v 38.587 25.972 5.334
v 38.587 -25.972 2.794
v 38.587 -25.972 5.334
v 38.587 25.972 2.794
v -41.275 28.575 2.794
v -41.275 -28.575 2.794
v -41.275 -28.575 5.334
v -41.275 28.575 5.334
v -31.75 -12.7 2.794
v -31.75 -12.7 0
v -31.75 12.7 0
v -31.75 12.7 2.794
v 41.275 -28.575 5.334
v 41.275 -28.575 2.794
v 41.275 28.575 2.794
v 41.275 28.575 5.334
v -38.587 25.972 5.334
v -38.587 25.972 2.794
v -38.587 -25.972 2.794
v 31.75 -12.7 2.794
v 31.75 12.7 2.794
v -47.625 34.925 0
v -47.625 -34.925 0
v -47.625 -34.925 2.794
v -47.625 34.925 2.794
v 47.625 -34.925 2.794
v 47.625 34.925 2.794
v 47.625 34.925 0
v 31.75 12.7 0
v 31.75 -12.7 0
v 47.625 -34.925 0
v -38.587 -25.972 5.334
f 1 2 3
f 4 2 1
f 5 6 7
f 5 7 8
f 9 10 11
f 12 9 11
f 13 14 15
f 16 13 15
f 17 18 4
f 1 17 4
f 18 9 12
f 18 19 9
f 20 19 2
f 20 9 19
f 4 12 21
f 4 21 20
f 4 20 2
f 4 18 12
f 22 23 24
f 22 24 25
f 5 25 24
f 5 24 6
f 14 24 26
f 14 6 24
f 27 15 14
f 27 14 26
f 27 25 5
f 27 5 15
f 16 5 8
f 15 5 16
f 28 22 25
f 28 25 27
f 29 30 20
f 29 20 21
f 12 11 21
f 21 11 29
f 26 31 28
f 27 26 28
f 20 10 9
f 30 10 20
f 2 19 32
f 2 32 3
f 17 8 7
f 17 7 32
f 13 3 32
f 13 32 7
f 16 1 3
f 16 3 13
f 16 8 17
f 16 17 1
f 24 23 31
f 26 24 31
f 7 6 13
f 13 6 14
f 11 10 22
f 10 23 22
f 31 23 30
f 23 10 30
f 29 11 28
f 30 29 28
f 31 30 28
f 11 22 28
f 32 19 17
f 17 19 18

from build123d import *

# Parameters (mm, degrees)
F0_W     = 95.25
F0_H     = 69.85
F0_W_2   = 82.55
F0_H_2   = 57.15
F1_DEPTH = 2.794
F0_W_3   = 77.174016
F0_H_3   = 51.943318
F2_DEPTH = 5.334
F0_W_4   = 63.5
F0_H_4   = 25.4
F3_DEPTH = 2.794


with BuildPart() as f1:
    # F0 (on Top) → F1 (new body)
    with BuildSketch(Plane.XY):
        Rectangle(F0_W, F0_H)
        Rectangle(F0_W_2, F0_H_2, mode=Mode.SUBTRACT)
    extrude(amount=F1_DEPTH)

    # F0 (on Top) → F2 (join)
    with BuildSketch(Plane.XY):
        Rectangle(F0_W_2, F0_H_2)
        Rectangle(F0_W_3, F0_H_3, mode=Mode.SUBTRACT)
    extrude(amount=F2_DEPTH)

    # F0 (on Top) → F3 (join)
    with BuildSketch(Plane.XY):
        Rectangle(F0_W_3, F0_H_3)
        Rectangle(F0_W_4, F0_H_4, mode=Mode.SUBTRACT)
    extrude(amount=F3_DEPTH)


solid = f1.part
